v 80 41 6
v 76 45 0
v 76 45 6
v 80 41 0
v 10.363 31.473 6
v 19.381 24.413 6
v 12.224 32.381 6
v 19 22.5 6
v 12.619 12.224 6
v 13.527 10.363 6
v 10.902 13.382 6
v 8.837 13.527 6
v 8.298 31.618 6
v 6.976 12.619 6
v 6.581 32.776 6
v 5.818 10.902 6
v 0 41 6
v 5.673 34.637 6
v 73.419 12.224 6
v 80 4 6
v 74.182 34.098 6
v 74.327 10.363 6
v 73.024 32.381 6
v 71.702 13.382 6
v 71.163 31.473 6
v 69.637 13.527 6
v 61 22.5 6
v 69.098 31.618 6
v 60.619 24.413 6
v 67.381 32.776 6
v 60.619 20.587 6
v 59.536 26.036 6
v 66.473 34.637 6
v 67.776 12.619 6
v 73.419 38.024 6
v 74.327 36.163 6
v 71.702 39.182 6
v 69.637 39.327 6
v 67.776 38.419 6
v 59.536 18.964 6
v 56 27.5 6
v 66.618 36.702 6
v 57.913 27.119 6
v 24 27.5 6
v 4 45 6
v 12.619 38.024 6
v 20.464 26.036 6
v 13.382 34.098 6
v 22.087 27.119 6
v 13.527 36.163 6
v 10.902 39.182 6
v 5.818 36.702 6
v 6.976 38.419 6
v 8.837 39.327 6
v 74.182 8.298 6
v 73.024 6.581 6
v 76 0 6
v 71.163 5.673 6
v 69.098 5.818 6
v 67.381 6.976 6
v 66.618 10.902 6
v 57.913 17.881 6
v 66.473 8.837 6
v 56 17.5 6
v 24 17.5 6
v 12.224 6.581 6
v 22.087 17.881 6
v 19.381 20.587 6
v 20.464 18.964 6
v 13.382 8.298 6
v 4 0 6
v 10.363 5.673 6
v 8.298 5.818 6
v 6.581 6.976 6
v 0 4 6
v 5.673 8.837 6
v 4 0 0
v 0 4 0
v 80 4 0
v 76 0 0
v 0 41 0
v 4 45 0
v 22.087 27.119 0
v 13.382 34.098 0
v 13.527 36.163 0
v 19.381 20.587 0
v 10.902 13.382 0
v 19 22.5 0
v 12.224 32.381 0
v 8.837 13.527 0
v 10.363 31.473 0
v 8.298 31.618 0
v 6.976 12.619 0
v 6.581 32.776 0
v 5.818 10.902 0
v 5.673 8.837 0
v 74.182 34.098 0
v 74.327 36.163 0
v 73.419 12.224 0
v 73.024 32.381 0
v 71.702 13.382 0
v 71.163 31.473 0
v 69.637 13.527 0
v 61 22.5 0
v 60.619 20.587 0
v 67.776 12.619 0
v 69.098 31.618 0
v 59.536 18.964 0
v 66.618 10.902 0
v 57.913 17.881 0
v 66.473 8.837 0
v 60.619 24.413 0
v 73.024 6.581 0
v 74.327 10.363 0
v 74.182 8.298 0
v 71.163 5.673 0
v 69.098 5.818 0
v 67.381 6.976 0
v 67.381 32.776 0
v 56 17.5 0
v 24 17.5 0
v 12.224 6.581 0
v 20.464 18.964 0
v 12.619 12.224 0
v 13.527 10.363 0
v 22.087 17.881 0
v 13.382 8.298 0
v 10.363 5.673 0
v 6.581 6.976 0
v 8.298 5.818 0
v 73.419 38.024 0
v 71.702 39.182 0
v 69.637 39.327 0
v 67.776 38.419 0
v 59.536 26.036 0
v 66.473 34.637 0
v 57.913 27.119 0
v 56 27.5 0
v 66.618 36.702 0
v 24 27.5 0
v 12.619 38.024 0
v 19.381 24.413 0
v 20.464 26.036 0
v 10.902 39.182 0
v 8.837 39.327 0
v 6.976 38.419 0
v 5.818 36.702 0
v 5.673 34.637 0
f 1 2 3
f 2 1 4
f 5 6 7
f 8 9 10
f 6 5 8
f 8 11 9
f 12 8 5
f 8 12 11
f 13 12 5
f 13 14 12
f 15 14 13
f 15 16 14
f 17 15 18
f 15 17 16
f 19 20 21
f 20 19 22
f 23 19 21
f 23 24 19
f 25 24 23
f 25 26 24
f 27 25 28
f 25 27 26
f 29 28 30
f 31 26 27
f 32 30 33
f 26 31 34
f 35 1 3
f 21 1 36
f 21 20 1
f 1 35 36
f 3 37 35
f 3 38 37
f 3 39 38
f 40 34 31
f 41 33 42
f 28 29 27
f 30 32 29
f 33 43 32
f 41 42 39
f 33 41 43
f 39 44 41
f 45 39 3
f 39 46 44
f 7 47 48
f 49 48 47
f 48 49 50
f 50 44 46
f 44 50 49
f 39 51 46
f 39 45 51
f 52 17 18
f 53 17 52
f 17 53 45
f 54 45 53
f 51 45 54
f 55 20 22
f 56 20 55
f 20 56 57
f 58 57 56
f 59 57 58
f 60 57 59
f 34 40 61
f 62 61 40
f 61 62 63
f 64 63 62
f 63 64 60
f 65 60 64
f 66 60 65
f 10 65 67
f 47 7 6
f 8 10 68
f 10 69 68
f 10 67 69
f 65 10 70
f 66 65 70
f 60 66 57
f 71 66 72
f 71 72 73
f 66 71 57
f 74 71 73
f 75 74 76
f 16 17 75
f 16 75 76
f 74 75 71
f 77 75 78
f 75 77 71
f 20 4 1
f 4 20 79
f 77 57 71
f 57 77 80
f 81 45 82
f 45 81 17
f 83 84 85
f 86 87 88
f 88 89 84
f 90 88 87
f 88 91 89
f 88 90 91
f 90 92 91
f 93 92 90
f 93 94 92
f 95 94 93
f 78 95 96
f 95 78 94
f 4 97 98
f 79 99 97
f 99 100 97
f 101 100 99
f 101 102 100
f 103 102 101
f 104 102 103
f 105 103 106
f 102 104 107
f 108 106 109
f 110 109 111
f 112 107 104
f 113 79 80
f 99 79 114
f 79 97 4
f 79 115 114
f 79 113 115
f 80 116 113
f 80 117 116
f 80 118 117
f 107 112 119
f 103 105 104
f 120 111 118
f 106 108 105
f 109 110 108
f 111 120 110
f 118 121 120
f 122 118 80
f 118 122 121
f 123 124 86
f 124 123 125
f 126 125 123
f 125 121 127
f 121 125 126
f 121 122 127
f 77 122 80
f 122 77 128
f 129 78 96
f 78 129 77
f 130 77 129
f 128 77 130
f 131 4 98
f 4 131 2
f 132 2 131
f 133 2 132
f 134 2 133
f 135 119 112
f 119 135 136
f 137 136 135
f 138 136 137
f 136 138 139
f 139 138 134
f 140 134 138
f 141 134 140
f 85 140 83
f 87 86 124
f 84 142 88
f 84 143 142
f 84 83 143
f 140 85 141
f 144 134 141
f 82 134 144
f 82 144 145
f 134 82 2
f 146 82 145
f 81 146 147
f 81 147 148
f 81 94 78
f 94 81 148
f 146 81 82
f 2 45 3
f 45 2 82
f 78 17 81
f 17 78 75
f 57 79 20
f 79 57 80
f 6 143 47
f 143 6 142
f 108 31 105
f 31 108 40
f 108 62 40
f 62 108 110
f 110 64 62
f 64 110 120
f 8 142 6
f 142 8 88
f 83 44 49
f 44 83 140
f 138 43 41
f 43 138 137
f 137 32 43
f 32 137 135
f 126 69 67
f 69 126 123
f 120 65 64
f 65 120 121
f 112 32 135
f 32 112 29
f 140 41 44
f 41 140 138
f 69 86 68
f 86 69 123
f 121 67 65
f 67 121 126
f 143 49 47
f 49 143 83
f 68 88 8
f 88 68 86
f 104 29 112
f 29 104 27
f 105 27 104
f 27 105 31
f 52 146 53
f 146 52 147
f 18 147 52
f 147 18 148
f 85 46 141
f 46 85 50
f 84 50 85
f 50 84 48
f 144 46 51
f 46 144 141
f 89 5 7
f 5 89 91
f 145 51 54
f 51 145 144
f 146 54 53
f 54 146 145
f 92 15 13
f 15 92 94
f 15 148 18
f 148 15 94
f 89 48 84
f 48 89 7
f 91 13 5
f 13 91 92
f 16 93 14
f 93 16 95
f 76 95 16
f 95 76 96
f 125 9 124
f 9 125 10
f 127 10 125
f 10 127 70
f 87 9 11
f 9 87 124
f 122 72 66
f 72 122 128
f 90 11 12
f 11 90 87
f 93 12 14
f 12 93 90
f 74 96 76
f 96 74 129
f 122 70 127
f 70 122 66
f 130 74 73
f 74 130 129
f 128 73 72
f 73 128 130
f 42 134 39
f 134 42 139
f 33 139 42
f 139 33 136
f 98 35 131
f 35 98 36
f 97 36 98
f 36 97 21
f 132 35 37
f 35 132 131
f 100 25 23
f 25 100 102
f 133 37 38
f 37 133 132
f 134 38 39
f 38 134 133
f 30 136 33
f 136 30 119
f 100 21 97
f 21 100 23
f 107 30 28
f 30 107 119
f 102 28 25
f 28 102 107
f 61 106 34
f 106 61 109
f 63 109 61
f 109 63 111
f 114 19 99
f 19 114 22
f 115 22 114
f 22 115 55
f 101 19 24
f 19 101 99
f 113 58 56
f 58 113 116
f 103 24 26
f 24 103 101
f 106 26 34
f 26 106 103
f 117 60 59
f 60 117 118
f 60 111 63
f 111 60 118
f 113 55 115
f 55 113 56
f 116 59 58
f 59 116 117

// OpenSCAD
$fn = 32;

// ----------------------------------------------------------------------
// Bracket plate: slot plate 80 x 45
// ----------------------------------------------------------------------

// --- parameters (mm) ---
hole_r = 4;               // bolt hole radius
plate_t = 6;              // plate thickness, Z (extrusion height)
plate_l = 80;             // plate length
plate_w = 45;             // plate width
slot_l = 32;              // slot straight length
slot_r = 5;               // slot end radius

slot_len = slot_l + 2 * slot_r;
slot_w = 2 * slot_r;
hole_d2 = 2 * hole_r;

profile = [[4, 0], [76, 0], [80, 4], [80, 41], [76, 45], [4, 45], [0, 41], [0, 4]];  // primary outline, 8 points, counter clockwise
void_1 = [[56, 17.5], [57.913, 17.881], [59.536, 18.964], [60.619, 20.587], [61, 22.5], [60.619, 24.413], [59.536, 26.036], [57.913, 27.119], [56, 27.5], [24, 27.5], [22.087, 27.119], [20.464, 26.036], [19.381, 24.413], [19, 22.5], [19.381, 20.587], [20.464, 18.964], [22.087, 17.881], [24, 17.5]];  // grip slot, 18 points
void_2 = [[13.527, 36.163], [12.619, 38.024], [10.902, 39.182], [8.837, 39.327], [6.976, 38.419], [5.818, 36.702], [5.673, 34.637], [6.581, 32.776], [8.298, 31.618], [10.363, 31.473], [12.224, 32.381], [13.382, 34.098]];  // corner hole, 12 points
void_3 = [[13.527, 10.363], [12.619, 12.224], [10.902, 13.382], [8.837, 13.527], [6.976, 12.619], [5.818, 10.902], [5.673, 8.837], [6.581, 6.976], [8.298, 5.818], [10.363, 5.673], [12.224, 6.581], [13.382, 8.298]];  // corner hole, 12 points
void_4 = [[74.327, 36.163], [73.419, 38.024], [71.702, 39.182], [69.637, 39.327], [67.776, 38.419], [66.618, 36.702], [66.473, 34.637], [67.381, 32.776], [69.098, 31.618], [71.163, 31.473], [73.024, 32.381], [74.182, 34.098]];  // corner hole, 12 points
void_5 = [[74.327, 10.363], [73.419, 12.224], [71.702, 13.382], [69.637, 13.527], [67.776, 12.619], [66.618, 10.902], [66.473, 8.837], [67.381, 6.976], [69.098, 5.818], [71.163, 5.673], [73.024, 6.581], [74.182, 8.298]];  // corner hole, 12 points

// --- the one profile operation ---
difference() {
  linear_extrude(height = plate_t) polygon(points = profile);
  translate([0, 0, -1])
    linear_extrude(height = plate_t + 2) polygon(points = void_1);
  translate([0, 0, -1])
    linear_extrude(height = plate_t + 2) polygon(points = void_2);
  translate([0, 0, -1])
    linear_extrude(height = plate_t + 2) polygon(points = void_3);
  translate([0, 0, -1])
    linear_extrude(height = plate_t + 2) polygon(points = void_4);
  translate([0, 0, -1])
    linear_extrude(height = plate_t + 2) polygon(points = void_5);
}
